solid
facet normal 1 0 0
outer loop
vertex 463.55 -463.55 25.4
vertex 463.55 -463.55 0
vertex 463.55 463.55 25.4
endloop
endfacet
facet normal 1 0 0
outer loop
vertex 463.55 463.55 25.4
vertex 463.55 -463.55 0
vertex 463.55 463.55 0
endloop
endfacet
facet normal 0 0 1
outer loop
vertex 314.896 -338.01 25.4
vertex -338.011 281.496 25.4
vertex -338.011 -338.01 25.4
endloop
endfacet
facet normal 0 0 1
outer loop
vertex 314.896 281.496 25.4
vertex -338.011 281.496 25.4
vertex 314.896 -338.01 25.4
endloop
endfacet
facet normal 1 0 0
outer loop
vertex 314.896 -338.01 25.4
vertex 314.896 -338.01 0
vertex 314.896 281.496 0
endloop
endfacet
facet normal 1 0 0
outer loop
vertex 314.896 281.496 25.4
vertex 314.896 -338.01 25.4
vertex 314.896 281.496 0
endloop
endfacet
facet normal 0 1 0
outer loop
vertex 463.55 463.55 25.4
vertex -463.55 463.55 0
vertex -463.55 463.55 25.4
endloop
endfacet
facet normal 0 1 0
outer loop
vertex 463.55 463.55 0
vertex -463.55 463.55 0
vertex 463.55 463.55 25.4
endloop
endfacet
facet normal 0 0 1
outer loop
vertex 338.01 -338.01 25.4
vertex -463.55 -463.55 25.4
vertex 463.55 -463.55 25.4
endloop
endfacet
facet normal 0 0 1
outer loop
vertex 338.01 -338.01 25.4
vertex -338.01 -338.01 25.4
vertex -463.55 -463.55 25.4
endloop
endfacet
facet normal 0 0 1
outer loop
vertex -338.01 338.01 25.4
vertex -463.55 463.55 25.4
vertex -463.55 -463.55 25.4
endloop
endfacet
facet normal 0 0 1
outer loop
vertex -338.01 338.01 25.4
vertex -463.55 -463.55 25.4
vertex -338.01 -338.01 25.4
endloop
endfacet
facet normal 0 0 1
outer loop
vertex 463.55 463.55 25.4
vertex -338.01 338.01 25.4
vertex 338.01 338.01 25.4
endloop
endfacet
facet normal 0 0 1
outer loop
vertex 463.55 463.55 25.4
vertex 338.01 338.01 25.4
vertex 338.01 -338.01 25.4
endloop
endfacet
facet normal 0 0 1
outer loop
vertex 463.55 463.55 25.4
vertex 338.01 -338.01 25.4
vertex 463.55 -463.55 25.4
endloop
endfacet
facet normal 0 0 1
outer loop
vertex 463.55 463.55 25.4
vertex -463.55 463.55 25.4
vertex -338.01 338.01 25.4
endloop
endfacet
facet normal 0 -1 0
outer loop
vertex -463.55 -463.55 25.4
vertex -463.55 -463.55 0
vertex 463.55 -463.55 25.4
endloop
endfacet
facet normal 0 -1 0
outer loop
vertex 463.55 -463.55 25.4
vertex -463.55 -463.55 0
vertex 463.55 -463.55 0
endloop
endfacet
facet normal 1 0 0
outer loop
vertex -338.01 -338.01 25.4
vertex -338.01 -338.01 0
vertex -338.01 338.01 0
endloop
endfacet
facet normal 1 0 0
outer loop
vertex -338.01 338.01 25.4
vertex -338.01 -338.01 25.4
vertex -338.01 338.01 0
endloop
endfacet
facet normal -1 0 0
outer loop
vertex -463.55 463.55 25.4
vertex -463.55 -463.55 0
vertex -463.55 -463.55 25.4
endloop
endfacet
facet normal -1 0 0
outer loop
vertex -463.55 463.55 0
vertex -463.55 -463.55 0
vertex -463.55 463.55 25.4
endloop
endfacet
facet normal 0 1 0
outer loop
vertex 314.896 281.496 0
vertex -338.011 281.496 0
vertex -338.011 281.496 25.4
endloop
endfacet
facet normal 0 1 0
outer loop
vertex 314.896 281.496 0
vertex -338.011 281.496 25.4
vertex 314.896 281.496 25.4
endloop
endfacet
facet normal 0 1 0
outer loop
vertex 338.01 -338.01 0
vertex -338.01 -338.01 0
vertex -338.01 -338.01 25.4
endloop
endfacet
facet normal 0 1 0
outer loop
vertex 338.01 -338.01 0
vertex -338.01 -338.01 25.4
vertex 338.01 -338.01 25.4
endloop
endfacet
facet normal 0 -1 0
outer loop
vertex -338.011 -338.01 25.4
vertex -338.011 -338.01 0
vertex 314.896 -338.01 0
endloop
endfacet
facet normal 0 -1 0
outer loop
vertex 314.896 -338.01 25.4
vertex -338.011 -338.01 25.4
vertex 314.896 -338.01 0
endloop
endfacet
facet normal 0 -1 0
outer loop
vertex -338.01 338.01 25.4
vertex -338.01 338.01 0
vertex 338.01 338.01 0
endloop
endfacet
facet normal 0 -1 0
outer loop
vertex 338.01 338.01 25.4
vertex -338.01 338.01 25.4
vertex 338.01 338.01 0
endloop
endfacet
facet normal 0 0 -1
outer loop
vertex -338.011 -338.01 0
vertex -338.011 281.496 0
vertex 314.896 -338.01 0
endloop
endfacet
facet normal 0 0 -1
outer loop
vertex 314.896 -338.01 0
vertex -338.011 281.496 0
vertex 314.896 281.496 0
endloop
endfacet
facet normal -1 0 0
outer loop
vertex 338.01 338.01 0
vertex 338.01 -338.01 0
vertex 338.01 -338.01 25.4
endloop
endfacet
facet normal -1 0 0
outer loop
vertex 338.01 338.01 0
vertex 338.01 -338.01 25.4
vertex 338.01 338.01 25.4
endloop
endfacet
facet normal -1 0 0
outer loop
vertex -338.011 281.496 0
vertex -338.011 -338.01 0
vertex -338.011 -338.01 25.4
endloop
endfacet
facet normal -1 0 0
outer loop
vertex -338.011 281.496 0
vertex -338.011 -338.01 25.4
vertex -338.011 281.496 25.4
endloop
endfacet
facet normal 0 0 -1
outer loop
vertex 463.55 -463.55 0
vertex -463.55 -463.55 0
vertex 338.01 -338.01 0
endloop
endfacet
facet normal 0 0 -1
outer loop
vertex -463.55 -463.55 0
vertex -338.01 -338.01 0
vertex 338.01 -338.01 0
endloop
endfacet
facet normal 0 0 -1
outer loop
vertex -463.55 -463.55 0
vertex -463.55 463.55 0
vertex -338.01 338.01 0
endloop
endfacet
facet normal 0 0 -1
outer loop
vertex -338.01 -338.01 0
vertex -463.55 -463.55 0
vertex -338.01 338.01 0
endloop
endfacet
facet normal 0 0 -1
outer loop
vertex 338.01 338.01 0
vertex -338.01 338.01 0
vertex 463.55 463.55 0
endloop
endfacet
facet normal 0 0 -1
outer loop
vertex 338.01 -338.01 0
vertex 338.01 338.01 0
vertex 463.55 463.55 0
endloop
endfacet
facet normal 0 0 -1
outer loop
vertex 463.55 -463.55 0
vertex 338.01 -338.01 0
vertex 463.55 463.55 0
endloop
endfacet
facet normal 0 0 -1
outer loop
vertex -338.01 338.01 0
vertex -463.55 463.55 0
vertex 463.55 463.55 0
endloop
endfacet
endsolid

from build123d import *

# Parameters (mm, degrees)
F0_W     = 927.1
F0_H     = 927.1
F0_W_2   = 676.021
F0_H_2   = 676.021
F1_DEPTH = 25.4
F2_W     = 652.907
F2_H     = 619.506
F3_DEPTH = 25.4


with BuildPart() as f1:
    # F0 (on Top) → F1 (new body)
    with BuildSketch(Plane.XY):
        Rectangle(F0_W, F0_H)
        Rectangle(F0_W_2, F0_H_2, mode=Mode.SUBTRACT)
    extrude(amount=F1_DEPTH)


with BuildPart() as f3:
    # F2 (on Top) → F3 (new body)
    with BuildSketch(Plane.XY):
        with Locations((-11.557, -28.2575)):
            Rectangle(F2_W, F2_H)
    extrude(amount=F3_DEPTH)


solid = Compound([f1.part, f3.part])
